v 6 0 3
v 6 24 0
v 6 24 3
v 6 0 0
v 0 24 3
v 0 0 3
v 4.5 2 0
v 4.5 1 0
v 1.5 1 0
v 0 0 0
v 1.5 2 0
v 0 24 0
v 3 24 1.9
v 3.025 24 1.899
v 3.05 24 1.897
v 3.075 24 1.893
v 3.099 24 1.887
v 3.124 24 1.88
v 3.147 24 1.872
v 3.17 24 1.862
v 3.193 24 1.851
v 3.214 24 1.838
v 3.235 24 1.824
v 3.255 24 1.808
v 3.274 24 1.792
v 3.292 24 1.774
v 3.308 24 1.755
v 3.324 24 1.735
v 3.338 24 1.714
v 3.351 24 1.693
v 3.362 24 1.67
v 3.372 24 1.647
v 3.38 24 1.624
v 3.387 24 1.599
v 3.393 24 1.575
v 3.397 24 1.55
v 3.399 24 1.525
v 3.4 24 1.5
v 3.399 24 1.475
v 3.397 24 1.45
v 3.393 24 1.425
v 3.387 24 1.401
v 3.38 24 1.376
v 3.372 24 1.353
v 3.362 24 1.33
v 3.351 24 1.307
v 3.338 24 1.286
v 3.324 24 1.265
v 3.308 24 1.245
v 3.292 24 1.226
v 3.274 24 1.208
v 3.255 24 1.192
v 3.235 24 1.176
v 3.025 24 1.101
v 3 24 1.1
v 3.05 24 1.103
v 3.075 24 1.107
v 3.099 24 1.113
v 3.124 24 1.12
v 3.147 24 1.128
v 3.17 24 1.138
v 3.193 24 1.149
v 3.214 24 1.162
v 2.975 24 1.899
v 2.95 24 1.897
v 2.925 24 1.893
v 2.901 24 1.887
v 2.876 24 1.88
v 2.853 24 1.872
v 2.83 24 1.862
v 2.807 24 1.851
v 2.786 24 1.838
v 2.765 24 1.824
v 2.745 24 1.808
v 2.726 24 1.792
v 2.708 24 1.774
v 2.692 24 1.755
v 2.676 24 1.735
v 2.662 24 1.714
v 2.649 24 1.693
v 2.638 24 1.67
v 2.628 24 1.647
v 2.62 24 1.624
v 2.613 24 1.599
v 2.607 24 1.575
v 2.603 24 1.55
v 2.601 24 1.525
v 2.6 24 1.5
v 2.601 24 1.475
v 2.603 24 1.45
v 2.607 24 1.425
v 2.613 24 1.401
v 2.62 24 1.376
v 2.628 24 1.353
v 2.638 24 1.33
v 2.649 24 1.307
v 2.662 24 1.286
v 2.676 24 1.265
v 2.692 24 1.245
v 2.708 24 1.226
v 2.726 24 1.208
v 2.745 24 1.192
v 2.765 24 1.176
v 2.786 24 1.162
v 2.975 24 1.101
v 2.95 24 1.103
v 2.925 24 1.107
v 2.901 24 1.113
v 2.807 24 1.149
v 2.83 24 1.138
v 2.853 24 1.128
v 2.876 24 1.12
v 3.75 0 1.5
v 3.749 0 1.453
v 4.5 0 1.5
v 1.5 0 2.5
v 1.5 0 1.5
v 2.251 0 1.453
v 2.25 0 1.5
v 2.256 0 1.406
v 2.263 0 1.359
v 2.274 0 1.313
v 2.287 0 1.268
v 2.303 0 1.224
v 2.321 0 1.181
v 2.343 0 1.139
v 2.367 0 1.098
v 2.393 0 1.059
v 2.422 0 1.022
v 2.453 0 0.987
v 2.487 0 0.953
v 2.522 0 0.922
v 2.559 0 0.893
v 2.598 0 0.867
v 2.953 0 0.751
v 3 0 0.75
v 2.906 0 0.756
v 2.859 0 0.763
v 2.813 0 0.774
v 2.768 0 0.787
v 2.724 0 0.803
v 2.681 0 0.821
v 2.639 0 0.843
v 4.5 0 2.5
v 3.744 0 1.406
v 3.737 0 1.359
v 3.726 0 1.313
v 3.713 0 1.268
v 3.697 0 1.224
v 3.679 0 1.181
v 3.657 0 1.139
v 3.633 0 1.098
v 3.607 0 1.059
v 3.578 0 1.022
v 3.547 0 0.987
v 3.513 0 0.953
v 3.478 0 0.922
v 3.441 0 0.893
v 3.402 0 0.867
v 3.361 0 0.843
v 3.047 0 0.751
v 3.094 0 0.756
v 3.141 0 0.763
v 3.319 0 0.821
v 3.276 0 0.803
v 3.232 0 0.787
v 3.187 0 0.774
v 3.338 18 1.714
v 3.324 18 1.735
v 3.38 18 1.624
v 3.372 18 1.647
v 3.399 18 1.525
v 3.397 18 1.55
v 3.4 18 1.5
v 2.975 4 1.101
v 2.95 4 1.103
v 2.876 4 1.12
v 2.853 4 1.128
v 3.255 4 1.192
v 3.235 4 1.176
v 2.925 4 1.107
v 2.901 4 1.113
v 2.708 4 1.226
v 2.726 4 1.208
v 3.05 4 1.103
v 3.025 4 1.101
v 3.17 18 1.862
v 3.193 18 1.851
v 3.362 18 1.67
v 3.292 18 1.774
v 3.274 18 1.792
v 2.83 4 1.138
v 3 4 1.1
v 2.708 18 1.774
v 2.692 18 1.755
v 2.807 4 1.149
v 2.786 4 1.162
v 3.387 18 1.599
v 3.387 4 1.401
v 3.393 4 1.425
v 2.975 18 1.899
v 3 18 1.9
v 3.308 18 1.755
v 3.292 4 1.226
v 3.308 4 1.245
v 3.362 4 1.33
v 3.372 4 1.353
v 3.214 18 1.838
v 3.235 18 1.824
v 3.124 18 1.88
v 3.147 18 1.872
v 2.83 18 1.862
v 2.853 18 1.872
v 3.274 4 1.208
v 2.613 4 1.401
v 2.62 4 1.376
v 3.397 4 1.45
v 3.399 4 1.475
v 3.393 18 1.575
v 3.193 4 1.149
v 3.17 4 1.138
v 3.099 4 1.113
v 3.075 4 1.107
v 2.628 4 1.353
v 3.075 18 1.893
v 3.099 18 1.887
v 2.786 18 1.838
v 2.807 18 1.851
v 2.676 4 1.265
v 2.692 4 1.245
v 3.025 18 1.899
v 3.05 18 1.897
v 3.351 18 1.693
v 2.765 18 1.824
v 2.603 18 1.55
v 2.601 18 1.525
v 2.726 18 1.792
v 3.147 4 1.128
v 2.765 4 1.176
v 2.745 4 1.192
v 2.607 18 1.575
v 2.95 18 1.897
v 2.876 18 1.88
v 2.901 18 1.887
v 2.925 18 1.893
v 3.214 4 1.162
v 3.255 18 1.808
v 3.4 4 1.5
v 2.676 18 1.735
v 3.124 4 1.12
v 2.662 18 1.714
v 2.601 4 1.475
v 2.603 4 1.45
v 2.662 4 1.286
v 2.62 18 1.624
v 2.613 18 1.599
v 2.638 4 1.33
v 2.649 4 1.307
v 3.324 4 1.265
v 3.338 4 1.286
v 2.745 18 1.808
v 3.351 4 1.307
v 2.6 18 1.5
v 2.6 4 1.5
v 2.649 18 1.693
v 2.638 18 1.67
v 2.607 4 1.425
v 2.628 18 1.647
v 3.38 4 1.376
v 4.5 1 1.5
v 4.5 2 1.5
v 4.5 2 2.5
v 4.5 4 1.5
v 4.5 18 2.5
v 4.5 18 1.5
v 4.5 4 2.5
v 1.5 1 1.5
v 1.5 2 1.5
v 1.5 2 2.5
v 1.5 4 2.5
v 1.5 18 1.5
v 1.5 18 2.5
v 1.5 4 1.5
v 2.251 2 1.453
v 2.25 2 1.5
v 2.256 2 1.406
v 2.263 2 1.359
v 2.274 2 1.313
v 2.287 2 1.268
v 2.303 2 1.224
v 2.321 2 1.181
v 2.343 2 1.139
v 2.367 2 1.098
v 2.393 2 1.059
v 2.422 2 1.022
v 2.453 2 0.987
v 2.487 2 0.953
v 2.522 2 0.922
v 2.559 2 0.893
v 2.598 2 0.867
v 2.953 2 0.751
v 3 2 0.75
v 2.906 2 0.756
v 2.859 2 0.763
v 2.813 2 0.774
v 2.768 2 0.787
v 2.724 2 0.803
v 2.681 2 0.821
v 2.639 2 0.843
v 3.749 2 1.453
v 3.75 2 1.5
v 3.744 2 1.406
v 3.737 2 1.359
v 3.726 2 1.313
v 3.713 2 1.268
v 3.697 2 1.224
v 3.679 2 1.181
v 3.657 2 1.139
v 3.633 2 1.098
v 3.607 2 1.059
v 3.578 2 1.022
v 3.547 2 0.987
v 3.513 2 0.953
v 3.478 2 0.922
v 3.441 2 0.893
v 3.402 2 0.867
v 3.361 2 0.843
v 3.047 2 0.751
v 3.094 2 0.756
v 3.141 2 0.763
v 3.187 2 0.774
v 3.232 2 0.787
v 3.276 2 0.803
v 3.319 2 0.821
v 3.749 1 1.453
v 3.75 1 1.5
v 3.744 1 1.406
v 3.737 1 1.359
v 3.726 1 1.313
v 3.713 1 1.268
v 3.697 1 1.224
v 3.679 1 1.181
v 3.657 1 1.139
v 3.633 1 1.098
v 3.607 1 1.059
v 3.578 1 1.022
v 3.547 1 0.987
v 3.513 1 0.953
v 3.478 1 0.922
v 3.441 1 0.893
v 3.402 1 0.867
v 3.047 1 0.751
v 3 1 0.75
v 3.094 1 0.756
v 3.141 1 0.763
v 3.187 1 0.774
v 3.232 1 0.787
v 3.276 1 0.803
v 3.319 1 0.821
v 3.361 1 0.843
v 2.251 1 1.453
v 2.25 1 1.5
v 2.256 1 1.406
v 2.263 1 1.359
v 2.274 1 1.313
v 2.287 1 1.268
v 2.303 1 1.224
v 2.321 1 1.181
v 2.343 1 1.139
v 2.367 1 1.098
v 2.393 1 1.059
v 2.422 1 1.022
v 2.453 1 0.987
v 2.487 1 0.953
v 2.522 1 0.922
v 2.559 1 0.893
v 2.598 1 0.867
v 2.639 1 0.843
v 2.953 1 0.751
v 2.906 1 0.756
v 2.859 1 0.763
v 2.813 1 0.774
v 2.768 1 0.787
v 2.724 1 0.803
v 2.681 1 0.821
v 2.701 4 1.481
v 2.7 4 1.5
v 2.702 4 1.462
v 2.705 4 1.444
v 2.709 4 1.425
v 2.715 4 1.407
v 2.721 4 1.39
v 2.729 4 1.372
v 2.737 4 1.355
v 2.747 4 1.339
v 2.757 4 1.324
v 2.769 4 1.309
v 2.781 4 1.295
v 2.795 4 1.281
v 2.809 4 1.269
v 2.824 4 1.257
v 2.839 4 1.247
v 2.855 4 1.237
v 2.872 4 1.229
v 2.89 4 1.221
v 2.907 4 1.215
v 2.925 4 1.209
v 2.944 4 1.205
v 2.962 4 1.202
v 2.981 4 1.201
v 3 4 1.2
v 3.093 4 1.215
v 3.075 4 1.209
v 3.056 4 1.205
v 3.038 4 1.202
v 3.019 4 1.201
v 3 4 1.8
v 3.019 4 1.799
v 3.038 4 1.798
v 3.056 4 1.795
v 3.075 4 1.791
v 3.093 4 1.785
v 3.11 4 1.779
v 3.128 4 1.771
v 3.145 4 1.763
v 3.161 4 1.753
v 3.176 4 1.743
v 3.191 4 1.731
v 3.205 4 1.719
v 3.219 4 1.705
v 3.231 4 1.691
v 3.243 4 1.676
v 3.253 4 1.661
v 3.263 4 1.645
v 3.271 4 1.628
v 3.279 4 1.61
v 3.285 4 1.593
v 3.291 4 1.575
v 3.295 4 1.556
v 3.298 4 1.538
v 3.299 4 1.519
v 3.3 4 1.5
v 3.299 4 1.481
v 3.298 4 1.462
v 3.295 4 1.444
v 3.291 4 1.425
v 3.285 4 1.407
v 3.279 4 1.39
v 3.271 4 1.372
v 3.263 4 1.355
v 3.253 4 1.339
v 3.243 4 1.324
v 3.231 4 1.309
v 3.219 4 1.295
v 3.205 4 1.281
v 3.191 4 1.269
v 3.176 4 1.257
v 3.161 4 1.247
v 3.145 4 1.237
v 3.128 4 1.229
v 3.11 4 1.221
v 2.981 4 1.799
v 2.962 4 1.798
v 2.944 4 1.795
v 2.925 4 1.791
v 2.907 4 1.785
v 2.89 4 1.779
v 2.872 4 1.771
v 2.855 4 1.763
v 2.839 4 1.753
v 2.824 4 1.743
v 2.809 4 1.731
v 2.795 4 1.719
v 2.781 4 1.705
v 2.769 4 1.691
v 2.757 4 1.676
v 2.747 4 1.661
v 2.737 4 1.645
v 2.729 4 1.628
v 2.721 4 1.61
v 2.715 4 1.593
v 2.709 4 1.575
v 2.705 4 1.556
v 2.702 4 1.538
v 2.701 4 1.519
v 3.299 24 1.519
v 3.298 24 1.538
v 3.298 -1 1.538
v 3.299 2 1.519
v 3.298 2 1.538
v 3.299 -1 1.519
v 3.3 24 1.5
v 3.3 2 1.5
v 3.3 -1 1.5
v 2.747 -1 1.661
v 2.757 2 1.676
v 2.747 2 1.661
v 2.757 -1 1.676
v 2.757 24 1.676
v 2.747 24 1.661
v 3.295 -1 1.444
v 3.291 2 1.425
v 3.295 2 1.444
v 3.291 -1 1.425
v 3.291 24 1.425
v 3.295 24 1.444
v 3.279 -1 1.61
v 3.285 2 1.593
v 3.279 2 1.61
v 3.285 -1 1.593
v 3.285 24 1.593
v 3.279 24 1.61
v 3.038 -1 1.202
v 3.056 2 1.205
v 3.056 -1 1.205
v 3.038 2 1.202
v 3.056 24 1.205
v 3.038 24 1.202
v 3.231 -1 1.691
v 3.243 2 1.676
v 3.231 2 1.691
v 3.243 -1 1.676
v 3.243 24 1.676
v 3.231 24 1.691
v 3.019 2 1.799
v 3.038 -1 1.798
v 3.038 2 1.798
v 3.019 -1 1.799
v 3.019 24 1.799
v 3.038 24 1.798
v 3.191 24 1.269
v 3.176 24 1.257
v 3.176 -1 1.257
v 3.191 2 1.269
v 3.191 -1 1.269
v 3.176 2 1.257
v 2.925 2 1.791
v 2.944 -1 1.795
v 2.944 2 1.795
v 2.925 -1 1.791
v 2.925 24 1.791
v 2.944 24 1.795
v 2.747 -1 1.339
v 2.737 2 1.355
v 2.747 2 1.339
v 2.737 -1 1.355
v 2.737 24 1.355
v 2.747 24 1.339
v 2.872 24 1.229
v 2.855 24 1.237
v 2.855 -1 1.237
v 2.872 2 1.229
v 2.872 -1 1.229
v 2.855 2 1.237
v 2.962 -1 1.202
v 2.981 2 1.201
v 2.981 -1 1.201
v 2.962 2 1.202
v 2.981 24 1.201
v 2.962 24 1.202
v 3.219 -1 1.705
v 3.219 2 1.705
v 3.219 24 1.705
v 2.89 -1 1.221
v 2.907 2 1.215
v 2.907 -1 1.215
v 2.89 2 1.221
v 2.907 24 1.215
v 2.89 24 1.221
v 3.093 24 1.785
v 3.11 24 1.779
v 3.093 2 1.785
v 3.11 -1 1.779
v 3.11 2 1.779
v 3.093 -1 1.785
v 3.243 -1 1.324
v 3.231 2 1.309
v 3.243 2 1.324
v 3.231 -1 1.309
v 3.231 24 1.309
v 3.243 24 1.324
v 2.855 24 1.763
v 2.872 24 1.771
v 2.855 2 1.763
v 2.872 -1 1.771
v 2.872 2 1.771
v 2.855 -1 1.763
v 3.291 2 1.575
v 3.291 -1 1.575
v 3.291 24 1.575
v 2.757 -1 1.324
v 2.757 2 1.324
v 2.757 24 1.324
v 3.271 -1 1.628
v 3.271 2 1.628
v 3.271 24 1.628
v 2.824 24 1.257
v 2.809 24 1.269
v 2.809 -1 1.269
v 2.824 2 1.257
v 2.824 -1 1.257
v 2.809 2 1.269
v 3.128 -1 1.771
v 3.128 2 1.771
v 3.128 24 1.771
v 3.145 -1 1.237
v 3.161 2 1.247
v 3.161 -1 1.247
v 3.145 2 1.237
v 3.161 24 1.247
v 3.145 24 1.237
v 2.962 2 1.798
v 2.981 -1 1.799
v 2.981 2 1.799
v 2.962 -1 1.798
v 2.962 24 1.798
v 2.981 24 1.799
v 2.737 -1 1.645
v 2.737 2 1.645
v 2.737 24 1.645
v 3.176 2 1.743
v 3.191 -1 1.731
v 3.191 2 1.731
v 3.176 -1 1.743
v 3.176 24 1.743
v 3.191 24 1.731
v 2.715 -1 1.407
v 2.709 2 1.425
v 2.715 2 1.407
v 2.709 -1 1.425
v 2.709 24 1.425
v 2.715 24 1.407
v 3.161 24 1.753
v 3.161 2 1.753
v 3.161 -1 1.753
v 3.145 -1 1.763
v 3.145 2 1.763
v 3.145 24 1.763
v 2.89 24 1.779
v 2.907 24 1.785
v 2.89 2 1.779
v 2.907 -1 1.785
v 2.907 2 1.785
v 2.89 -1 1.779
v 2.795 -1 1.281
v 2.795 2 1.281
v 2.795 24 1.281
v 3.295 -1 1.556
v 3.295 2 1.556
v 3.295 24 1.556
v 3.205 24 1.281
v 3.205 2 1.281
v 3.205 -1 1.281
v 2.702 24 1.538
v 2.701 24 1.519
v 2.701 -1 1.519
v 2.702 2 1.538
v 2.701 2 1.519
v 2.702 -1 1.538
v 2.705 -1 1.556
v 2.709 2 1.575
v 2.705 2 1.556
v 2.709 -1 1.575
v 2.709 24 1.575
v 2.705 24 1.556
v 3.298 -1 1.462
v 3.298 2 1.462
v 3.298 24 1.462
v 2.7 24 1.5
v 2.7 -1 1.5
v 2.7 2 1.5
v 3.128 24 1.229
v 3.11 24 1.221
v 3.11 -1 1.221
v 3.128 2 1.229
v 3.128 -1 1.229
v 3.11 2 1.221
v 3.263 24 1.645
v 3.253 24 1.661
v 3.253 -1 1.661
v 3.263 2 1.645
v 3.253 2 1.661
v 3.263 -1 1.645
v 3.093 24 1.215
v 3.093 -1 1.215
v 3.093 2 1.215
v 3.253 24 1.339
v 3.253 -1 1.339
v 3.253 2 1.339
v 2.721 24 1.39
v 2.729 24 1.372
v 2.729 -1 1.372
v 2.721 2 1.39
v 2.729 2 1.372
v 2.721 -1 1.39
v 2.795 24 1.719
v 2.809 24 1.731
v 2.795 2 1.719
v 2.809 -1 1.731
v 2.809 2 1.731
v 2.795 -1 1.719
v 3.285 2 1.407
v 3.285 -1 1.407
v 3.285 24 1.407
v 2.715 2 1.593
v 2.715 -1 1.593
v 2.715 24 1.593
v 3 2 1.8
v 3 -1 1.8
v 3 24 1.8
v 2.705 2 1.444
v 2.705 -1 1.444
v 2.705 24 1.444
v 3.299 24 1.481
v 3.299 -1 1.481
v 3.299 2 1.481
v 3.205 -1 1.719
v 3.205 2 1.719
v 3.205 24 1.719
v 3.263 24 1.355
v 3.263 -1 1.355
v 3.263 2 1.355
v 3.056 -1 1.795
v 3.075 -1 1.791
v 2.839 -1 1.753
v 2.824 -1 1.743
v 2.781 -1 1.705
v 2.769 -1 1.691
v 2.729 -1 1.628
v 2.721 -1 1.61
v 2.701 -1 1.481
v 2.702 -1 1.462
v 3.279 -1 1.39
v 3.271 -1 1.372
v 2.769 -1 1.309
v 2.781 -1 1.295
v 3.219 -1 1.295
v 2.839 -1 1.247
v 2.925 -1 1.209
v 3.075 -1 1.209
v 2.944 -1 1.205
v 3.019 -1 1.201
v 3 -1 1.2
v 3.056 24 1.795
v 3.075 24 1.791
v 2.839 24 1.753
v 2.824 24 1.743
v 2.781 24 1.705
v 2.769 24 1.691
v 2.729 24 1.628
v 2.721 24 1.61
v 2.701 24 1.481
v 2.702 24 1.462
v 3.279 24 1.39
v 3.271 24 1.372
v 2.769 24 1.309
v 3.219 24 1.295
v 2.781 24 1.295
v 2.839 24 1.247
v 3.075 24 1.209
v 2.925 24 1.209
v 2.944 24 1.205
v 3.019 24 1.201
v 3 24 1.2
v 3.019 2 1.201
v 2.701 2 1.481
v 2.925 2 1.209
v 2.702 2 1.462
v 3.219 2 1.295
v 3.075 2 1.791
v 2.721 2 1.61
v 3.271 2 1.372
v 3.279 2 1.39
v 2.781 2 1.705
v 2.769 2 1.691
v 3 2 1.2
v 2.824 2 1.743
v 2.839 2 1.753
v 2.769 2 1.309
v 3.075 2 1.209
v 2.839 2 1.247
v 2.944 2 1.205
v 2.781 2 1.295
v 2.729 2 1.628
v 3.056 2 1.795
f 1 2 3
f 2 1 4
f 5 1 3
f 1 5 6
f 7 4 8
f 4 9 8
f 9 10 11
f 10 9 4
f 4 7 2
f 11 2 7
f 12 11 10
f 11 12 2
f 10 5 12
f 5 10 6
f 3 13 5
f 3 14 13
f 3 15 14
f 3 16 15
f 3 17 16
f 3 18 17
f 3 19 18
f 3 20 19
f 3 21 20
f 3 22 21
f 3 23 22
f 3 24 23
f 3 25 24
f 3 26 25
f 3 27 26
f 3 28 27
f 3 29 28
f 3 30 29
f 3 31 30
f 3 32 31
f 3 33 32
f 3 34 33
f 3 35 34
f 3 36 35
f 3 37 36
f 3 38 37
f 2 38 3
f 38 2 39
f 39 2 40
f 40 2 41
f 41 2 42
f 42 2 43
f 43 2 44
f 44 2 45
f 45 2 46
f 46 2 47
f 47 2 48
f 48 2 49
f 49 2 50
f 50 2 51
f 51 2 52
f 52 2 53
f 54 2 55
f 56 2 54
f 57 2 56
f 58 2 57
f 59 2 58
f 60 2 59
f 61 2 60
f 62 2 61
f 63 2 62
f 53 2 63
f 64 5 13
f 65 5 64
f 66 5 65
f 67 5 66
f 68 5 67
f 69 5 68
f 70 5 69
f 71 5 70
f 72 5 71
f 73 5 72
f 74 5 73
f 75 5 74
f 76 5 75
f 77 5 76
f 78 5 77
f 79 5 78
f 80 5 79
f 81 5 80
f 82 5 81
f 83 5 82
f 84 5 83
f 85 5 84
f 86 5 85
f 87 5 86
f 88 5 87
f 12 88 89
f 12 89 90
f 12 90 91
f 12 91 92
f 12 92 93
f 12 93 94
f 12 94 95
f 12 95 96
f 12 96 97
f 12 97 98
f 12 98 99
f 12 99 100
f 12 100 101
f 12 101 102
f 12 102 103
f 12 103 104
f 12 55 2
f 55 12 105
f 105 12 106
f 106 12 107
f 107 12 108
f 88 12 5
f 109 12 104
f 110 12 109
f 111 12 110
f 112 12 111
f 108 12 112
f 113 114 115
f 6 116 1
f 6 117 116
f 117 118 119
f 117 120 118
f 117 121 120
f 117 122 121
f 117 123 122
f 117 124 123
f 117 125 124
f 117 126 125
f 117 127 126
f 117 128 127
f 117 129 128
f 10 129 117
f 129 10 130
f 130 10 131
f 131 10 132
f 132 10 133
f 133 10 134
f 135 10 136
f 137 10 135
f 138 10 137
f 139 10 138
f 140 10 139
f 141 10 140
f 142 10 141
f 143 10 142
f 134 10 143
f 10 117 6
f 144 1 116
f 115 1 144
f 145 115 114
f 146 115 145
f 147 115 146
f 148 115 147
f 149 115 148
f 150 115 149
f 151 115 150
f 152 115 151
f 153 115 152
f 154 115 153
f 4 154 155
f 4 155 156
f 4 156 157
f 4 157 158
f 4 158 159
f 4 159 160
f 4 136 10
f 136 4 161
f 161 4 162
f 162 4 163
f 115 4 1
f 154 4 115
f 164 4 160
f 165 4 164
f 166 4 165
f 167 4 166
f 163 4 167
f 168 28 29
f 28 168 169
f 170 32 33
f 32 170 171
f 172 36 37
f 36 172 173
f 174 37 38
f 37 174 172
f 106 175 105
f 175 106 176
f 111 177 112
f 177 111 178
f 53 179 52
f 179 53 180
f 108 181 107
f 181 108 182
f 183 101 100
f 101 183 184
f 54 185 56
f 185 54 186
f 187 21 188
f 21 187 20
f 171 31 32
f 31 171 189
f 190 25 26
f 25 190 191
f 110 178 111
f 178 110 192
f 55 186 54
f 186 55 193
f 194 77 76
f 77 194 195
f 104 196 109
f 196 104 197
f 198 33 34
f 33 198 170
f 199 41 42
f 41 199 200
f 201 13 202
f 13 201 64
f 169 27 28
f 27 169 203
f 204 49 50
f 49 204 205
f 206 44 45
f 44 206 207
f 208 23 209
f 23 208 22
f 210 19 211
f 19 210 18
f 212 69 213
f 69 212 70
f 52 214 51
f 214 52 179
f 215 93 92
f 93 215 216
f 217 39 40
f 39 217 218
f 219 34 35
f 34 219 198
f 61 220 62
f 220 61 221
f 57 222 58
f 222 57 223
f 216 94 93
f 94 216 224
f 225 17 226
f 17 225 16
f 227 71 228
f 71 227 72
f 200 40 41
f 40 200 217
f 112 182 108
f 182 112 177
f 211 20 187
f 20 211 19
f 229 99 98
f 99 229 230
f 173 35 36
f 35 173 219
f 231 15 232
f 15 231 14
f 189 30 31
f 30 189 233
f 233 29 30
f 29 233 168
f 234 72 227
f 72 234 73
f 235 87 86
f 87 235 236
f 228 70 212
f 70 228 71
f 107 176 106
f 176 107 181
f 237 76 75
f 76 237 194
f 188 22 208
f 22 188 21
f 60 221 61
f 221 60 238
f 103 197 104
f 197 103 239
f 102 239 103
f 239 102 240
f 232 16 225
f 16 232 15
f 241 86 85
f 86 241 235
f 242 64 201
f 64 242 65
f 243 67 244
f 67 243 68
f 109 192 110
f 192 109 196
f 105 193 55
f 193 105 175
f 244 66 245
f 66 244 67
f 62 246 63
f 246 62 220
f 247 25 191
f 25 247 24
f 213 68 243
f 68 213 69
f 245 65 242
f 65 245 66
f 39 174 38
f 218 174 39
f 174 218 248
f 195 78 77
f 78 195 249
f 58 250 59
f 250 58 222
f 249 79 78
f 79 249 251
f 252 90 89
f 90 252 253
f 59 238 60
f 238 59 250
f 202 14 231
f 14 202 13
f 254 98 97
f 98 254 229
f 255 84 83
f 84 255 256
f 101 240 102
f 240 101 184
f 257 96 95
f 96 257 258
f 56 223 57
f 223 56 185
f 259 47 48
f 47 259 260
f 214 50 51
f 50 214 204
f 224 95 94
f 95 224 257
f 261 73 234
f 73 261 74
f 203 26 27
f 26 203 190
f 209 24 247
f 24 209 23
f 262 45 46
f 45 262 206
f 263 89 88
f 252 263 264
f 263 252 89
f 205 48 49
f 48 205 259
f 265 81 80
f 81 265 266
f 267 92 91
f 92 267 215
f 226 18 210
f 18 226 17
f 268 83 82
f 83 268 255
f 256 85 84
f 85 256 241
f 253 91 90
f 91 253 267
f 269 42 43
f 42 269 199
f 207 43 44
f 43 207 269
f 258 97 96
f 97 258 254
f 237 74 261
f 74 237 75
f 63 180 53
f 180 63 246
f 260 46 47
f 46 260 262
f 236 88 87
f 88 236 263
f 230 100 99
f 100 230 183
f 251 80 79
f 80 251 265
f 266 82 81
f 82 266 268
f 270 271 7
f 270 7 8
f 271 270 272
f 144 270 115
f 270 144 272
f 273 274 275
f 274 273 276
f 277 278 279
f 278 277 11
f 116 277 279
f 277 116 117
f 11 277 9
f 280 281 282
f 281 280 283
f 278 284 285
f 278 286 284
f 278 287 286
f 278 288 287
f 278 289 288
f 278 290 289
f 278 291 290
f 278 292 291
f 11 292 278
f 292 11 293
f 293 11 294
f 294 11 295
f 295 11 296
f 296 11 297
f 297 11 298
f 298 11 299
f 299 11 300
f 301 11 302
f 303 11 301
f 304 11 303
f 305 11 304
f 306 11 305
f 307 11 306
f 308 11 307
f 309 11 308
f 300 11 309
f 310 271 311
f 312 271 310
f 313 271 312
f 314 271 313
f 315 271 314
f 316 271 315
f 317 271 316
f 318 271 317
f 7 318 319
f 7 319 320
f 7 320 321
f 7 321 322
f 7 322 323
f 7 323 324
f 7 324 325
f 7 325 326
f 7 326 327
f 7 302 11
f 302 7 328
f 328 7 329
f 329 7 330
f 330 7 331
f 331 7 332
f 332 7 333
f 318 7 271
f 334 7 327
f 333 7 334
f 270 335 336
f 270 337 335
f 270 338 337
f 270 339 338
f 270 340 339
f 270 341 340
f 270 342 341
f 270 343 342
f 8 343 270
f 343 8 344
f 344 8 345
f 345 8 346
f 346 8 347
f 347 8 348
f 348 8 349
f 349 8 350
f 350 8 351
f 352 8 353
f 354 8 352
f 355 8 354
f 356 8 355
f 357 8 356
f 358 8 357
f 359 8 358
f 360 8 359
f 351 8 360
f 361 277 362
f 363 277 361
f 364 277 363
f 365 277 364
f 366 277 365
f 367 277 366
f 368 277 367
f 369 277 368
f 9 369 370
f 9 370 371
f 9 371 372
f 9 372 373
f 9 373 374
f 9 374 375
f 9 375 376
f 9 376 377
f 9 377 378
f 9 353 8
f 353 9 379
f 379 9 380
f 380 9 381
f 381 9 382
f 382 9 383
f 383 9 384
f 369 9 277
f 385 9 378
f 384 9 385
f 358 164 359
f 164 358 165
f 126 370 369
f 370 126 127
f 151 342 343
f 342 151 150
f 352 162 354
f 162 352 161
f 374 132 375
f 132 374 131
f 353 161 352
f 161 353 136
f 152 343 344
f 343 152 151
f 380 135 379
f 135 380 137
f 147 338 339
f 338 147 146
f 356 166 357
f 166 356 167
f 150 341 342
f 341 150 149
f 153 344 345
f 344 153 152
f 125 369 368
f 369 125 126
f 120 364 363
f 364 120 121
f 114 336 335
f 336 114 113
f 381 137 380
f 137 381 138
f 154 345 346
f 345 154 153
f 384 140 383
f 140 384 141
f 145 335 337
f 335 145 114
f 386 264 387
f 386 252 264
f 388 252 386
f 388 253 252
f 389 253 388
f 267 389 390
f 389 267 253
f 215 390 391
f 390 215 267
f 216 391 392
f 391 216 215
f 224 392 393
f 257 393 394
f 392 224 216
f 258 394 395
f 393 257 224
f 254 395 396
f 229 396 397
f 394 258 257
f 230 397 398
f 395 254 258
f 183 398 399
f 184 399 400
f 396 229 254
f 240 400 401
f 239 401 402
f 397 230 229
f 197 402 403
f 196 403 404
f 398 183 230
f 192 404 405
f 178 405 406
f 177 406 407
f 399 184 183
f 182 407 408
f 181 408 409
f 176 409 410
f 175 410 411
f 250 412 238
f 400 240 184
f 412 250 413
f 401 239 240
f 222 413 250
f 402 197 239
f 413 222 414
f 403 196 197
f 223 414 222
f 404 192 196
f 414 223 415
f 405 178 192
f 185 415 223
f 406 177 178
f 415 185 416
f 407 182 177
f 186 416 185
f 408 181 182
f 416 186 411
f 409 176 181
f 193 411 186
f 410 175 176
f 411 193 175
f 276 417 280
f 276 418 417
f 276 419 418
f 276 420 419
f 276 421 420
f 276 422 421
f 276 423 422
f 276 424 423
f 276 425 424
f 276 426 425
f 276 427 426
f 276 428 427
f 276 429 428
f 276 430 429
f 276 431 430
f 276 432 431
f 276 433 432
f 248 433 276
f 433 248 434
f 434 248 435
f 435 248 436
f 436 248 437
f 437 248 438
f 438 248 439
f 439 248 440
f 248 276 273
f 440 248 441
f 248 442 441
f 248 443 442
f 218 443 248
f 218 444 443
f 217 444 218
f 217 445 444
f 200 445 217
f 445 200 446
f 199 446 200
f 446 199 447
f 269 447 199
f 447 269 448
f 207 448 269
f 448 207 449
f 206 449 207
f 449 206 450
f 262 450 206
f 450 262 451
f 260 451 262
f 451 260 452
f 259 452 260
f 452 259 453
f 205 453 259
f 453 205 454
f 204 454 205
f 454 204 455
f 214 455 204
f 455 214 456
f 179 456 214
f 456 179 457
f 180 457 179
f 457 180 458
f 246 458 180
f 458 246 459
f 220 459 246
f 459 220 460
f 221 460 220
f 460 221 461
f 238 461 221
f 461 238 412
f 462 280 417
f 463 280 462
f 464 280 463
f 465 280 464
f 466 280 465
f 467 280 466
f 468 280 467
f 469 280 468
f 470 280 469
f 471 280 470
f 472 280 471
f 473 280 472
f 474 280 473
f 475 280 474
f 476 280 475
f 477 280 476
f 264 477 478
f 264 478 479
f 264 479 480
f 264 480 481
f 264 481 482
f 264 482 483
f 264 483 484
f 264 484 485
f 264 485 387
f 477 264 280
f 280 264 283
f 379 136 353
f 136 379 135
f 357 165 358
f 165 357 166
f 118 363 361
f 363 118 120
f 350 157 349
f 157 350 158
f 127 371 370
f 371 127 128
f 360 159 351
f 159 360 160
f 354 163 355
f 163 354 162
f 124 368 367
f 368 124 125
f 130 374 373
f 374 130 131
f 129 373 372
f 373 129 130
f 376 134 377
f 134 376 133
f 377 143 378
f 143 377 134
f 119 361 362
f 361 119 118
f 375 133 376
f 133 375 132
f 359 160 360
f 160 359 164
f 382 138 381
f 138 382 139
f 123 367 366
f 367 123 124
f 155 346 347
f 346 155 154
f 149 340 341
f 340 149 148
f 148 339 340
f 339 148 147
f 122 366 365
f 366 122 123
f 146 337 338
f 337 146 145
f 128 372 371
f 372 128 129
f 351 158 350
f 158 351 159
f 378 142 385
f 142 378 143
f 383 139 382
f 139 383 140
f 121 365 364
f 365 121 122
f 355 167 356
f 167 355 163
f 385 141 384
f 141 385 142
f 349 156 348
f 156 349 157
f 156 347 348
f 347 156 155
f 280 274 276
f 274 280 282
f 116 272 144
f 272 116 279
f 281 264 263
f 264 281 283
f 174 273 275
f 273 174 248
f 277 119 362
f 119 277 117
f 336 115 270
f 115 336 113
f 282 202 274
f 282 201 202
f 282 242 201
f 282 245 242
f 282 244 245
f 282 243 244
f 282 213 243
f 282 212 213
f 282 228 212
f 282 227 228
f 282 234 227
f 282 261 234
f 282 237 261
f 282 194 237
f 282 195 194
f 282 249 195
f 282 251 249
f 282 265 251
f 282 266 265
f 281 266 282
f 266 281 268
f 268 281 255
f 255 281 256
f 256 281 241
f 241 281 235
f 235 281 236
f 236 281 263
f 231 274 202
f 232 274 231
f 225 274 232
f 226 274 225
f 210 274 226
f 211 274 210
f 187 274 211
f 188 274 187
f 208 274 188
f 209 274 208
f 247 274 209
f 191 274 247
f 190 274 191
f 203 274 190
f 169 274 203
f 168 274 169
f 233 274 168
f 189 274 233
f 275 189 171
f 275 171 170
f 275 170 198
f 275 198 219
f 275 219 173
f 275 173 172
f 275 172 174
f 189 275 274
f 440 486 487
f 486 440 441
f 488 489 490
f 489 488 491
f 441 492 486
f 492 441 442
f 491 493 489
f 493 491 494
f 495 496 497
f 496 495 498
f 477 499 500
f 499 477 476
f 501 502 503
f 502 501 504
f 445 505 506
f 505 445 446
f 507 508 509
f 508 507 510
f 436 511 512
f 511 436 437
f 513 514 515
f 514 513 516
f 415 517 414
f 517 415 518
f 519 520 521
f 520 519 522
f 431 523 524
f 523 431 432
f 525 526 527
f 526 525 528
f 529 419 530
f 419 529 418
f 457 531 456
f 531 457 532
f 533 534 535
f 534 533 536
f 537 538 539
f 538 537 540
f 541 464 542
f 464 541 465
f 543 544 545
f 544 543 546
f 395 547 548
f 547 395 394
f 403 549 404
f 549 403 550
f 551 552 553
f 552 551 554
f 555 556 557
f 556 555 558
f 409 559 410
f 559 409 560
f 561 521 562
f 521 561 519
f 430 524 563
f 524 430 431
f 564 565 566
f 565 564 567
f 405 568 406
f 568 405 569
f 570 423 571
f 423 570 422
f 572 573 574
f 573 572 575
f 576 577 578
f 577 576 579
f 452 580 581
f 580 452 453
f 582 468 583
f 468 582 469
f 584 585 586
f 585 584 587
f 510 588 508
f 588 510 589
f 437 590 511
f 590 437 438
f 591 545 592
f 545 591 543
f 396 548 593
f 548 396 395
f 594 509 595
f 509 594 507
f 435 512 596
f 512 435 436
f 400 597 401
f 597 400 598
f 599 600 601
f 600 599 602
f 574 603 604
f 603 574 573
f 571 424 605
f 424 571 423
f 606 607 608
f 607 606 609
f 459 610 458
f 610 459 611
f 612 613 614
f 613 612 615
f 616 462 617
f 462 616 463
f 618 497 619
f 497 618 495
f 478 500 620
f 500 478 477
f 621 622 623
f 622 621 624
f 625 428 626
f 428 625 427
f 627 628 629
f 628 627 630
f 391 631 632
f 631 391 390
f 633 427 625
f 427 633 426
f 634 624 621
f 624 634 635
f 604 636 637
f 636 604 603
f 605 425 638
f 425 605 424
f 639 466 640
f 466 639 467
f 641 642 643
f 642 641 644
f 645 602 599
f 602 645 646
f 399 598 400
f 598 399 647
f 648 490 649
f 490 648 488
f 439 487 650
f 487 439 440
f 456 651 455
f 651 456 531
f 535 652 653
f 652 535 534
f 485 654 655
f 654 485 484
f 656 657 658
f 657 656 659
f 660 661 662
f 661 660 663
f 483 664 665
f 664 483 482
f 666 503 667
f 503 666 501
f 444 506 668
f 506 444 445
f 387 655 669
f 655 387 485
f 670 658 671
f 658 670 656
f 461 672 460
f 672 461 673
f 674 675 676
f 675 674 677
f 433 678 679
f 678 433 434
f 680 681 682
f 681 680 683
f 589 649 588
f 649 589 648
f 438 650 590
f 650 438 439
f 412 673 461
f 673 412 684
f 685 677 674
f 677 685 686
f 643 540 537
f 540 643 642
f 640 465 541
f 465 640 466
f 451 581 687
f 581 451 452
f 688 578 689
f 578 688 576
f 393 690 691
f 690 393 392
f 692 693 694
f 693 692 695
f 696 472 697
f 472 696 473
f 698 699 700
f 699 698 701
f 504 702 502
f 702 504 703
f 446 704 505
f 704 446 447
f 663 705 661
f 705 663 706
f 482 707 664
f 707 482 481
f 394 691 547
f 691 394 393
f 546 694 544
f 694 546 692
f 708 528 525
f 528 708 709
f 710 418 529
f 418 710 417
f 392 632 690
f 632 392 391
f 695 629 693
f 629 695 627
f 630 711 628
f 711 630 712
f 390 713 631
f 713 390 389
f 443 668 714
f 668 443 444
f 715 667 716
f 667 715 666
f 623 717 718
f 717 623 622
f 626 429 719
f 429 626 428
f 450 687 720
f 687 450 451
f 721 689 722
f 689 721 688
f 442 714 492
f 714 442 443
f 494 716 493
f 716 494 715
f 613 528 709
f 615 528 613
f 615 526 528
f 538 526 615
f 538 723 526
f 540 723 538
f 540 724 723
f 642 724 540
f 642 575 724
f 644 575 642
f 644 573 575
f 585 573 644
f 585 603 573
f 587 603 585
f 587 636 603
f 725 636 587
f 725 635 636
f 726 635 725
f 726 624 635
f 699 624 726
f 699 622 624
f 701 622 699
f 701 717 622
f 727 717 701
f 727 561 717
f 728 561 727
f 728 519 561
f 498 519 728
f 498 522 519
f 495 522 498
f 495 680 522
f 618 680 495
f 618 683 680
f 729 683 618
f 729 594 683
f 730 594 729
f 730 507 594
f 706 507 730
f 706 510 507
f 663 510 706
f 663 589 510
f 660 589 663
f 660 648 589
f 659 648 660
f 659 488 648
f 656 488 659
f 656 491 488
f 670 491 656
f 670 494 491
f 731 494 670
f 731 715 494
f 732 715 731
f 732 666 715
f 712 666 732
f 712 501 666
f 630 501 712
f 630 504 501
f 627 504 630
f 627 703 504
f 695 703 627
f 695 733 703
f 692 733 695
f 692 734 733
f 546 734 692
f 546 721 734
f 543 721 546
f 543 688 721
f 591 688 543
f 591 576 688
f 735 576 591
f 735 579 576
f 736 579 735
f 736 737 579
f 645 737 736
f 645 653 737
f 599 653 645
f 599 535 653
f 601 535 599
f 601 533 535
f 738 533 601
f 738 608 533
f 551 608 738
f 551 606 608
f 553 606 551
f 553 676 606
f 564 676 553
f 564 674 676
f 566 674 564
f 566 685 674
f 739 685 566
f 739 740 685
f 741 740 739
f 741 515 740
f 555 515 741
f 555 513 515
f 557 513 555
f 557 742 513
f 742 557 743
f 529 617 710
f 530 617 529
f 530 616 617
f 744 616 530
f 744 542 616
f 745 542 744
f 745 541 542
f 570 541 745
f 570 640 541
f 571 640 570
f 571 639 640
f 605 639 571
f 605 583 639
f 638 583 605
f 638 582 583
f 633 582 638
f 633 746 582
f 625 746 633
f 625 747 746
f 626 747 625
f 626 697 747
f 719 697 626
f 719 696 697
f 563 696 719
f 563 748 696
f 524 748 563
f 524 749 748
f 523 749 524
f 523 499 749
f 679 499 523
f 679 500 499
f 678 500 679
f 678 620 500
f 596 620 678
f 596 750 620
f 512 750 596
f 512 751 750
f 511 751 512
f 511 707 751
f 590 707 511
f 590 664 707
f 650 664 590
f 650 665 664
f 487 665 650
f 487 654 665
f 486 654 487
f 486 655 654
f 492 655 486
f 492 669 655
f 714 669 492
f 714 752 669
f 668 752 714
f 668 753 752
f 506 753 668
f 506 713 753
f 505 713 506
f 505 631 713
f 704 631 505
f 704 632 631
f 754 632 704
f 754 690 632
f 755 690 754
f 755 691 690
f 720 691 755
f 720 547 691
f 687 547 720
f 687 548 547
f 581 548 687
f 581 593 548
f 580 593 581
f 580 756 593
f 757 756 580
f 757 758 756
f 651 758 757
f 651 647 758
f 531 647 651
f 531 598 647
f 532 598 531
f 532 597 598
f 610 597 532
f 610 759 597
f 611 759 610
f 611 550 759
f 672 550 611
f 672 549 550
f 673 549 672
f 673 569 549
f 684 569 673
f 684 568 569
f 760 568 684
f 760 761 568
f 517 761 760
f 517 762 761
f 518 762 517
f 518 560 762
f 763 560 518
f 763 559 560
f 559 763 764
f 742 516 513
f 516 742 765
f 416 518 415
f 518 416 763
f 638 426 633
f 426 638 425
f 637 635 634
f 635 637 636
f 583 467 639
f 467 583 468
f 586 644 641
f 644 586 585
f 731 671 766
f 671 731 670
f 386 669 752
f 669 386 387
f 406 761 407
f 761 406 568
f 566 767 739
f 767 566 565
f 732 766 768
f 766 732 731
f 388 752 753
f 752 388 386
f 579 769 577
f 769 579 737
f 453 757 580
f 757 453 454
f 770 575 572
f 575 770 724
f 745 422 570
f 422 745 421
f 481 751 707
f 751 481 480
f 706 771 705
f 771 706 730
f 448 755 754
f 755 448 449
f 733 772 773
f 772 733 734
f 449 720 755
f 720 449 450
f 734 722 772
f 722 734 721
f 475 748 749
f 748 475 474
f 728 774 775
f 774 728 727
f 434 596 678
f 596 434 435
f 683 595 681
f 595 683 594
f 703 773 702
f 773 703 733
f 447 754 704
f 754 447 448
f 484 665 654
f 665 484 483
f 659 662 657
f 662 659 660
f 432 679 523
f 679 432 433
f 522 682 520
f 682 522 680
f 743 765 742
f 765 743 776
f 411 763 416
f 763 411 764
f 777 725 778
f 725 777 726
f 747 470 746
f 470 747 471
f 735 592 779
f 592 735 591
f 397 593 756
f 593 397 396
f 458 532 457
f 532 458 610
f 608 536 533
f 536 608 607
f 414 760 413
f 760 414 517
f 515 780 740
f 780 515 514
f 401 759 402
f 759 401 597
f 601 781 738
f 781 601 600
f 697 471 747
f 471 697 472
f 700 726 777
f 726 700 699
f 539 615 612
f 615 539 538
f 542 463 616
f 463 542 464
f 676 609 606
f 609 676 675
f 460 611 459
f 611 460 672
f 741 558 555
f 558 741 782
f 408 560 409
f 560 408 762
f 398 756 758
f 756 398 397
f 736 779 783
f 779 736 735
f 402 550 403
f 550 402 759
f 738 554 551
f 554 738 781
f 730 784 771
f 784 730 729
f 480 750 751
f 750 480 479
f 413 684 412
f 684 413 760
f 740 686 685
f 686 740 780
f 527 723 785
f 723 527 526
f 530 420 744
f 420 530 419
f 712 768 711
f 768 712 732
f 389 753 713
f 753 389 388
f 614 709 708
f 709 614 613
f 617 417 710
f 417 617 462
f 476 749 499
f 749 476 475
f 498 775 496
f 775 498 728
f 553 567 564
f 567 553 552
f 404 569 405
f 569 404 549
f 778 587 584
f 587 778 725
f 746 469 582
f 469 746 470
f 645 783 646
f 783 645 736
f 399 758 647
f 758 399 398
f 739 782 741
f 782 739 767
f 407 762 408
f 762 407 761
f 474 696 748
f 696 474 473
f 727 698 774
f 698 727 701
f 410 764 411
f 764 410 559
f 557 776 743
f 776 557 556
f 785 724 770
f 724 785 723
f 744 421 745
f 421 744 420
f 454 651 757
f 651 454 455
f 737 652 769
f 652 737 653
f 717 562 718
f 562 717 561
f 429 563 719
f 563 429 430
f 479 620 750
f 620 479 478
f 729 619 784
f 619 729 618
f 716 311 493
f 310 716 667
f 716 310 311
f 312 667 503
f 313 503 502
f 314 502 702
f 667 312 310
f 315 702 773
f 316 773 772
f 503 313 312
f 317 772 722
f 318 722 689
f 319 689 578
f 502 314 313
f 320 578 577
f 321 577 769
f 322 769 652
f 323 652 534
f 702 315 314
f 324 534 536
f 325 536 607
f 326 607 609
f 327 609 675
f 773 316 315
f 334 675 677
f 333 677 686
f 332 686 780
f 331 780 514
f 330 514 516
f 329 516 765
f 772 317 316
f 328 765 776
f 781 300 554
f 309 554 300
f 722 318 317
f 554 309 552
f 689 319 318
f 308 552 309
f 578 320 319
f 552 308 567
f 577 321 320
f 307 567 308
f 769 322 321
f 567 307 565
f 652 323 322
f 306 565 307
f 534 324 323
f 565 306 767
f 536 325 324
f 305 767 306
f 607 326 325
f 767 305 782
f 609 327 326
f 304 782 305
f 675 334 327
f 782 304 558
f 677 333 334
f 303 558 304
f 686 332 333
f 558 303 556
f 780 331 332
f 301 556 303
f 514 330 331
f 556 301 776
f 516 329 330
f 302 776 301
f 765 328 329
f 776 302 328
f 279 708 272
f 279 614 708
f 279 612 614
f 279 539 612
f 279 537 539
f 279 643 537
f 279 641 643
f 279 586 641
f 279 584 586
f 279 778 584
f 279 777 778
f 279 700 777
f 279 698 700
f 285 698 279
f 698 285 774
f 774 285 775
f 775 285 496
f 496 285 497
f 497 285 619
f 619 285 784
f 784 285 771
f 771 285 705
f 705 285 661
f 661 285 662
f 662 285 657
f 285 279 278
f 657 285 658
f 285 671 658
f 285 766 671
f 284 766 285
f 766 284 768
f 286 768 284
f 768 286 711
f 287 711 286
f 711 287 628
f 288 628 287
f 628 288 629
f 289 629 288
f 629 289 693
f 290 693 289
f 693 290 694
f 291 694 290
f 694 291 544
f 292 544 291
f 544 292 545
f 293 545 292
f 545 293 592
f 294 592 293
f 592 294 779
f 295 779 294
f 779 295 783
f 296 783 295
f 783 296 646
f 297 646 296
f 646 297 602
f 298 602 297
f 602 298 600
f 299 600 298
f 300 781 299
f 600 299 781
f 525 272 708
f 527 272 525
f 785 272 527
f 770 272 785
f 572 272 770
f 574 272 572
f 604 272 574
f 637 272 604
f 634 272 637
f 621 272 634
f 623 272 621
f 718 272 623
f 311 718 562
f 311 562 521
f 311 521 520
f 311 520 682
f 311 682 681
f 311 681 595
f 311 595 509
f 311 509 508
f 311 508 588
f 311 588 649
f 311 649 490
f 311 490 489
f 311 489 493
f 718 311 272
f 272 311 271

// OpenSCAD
$fn = 100;


difference(){
    cube([6,24,3]);
    rotate([90,0,0])translate([3,1.5,-24])cylinder(d=0.8,h=25);
    translate([1.5,1,-.5])cube([3,1.,2.5]);
    rotate([90,0,0])translate([3,1.5,-4])cylinder(d=1.5,h=20);
    translate([1.5,-2.,1.5])cube([3,20,1.]);
}

color([1,0,0])rotate([90,0,0])translate([3,1.5,-24])cylinder(d=0.6,h=25);

//bearing
color([0,1,1])rotate([90,0,0])translate([3,1.5,-4])cylinder(d=1.5,h=2);
color([0,1,1])translate([1.5,2.,1.5])cube([3,2,1.]);
